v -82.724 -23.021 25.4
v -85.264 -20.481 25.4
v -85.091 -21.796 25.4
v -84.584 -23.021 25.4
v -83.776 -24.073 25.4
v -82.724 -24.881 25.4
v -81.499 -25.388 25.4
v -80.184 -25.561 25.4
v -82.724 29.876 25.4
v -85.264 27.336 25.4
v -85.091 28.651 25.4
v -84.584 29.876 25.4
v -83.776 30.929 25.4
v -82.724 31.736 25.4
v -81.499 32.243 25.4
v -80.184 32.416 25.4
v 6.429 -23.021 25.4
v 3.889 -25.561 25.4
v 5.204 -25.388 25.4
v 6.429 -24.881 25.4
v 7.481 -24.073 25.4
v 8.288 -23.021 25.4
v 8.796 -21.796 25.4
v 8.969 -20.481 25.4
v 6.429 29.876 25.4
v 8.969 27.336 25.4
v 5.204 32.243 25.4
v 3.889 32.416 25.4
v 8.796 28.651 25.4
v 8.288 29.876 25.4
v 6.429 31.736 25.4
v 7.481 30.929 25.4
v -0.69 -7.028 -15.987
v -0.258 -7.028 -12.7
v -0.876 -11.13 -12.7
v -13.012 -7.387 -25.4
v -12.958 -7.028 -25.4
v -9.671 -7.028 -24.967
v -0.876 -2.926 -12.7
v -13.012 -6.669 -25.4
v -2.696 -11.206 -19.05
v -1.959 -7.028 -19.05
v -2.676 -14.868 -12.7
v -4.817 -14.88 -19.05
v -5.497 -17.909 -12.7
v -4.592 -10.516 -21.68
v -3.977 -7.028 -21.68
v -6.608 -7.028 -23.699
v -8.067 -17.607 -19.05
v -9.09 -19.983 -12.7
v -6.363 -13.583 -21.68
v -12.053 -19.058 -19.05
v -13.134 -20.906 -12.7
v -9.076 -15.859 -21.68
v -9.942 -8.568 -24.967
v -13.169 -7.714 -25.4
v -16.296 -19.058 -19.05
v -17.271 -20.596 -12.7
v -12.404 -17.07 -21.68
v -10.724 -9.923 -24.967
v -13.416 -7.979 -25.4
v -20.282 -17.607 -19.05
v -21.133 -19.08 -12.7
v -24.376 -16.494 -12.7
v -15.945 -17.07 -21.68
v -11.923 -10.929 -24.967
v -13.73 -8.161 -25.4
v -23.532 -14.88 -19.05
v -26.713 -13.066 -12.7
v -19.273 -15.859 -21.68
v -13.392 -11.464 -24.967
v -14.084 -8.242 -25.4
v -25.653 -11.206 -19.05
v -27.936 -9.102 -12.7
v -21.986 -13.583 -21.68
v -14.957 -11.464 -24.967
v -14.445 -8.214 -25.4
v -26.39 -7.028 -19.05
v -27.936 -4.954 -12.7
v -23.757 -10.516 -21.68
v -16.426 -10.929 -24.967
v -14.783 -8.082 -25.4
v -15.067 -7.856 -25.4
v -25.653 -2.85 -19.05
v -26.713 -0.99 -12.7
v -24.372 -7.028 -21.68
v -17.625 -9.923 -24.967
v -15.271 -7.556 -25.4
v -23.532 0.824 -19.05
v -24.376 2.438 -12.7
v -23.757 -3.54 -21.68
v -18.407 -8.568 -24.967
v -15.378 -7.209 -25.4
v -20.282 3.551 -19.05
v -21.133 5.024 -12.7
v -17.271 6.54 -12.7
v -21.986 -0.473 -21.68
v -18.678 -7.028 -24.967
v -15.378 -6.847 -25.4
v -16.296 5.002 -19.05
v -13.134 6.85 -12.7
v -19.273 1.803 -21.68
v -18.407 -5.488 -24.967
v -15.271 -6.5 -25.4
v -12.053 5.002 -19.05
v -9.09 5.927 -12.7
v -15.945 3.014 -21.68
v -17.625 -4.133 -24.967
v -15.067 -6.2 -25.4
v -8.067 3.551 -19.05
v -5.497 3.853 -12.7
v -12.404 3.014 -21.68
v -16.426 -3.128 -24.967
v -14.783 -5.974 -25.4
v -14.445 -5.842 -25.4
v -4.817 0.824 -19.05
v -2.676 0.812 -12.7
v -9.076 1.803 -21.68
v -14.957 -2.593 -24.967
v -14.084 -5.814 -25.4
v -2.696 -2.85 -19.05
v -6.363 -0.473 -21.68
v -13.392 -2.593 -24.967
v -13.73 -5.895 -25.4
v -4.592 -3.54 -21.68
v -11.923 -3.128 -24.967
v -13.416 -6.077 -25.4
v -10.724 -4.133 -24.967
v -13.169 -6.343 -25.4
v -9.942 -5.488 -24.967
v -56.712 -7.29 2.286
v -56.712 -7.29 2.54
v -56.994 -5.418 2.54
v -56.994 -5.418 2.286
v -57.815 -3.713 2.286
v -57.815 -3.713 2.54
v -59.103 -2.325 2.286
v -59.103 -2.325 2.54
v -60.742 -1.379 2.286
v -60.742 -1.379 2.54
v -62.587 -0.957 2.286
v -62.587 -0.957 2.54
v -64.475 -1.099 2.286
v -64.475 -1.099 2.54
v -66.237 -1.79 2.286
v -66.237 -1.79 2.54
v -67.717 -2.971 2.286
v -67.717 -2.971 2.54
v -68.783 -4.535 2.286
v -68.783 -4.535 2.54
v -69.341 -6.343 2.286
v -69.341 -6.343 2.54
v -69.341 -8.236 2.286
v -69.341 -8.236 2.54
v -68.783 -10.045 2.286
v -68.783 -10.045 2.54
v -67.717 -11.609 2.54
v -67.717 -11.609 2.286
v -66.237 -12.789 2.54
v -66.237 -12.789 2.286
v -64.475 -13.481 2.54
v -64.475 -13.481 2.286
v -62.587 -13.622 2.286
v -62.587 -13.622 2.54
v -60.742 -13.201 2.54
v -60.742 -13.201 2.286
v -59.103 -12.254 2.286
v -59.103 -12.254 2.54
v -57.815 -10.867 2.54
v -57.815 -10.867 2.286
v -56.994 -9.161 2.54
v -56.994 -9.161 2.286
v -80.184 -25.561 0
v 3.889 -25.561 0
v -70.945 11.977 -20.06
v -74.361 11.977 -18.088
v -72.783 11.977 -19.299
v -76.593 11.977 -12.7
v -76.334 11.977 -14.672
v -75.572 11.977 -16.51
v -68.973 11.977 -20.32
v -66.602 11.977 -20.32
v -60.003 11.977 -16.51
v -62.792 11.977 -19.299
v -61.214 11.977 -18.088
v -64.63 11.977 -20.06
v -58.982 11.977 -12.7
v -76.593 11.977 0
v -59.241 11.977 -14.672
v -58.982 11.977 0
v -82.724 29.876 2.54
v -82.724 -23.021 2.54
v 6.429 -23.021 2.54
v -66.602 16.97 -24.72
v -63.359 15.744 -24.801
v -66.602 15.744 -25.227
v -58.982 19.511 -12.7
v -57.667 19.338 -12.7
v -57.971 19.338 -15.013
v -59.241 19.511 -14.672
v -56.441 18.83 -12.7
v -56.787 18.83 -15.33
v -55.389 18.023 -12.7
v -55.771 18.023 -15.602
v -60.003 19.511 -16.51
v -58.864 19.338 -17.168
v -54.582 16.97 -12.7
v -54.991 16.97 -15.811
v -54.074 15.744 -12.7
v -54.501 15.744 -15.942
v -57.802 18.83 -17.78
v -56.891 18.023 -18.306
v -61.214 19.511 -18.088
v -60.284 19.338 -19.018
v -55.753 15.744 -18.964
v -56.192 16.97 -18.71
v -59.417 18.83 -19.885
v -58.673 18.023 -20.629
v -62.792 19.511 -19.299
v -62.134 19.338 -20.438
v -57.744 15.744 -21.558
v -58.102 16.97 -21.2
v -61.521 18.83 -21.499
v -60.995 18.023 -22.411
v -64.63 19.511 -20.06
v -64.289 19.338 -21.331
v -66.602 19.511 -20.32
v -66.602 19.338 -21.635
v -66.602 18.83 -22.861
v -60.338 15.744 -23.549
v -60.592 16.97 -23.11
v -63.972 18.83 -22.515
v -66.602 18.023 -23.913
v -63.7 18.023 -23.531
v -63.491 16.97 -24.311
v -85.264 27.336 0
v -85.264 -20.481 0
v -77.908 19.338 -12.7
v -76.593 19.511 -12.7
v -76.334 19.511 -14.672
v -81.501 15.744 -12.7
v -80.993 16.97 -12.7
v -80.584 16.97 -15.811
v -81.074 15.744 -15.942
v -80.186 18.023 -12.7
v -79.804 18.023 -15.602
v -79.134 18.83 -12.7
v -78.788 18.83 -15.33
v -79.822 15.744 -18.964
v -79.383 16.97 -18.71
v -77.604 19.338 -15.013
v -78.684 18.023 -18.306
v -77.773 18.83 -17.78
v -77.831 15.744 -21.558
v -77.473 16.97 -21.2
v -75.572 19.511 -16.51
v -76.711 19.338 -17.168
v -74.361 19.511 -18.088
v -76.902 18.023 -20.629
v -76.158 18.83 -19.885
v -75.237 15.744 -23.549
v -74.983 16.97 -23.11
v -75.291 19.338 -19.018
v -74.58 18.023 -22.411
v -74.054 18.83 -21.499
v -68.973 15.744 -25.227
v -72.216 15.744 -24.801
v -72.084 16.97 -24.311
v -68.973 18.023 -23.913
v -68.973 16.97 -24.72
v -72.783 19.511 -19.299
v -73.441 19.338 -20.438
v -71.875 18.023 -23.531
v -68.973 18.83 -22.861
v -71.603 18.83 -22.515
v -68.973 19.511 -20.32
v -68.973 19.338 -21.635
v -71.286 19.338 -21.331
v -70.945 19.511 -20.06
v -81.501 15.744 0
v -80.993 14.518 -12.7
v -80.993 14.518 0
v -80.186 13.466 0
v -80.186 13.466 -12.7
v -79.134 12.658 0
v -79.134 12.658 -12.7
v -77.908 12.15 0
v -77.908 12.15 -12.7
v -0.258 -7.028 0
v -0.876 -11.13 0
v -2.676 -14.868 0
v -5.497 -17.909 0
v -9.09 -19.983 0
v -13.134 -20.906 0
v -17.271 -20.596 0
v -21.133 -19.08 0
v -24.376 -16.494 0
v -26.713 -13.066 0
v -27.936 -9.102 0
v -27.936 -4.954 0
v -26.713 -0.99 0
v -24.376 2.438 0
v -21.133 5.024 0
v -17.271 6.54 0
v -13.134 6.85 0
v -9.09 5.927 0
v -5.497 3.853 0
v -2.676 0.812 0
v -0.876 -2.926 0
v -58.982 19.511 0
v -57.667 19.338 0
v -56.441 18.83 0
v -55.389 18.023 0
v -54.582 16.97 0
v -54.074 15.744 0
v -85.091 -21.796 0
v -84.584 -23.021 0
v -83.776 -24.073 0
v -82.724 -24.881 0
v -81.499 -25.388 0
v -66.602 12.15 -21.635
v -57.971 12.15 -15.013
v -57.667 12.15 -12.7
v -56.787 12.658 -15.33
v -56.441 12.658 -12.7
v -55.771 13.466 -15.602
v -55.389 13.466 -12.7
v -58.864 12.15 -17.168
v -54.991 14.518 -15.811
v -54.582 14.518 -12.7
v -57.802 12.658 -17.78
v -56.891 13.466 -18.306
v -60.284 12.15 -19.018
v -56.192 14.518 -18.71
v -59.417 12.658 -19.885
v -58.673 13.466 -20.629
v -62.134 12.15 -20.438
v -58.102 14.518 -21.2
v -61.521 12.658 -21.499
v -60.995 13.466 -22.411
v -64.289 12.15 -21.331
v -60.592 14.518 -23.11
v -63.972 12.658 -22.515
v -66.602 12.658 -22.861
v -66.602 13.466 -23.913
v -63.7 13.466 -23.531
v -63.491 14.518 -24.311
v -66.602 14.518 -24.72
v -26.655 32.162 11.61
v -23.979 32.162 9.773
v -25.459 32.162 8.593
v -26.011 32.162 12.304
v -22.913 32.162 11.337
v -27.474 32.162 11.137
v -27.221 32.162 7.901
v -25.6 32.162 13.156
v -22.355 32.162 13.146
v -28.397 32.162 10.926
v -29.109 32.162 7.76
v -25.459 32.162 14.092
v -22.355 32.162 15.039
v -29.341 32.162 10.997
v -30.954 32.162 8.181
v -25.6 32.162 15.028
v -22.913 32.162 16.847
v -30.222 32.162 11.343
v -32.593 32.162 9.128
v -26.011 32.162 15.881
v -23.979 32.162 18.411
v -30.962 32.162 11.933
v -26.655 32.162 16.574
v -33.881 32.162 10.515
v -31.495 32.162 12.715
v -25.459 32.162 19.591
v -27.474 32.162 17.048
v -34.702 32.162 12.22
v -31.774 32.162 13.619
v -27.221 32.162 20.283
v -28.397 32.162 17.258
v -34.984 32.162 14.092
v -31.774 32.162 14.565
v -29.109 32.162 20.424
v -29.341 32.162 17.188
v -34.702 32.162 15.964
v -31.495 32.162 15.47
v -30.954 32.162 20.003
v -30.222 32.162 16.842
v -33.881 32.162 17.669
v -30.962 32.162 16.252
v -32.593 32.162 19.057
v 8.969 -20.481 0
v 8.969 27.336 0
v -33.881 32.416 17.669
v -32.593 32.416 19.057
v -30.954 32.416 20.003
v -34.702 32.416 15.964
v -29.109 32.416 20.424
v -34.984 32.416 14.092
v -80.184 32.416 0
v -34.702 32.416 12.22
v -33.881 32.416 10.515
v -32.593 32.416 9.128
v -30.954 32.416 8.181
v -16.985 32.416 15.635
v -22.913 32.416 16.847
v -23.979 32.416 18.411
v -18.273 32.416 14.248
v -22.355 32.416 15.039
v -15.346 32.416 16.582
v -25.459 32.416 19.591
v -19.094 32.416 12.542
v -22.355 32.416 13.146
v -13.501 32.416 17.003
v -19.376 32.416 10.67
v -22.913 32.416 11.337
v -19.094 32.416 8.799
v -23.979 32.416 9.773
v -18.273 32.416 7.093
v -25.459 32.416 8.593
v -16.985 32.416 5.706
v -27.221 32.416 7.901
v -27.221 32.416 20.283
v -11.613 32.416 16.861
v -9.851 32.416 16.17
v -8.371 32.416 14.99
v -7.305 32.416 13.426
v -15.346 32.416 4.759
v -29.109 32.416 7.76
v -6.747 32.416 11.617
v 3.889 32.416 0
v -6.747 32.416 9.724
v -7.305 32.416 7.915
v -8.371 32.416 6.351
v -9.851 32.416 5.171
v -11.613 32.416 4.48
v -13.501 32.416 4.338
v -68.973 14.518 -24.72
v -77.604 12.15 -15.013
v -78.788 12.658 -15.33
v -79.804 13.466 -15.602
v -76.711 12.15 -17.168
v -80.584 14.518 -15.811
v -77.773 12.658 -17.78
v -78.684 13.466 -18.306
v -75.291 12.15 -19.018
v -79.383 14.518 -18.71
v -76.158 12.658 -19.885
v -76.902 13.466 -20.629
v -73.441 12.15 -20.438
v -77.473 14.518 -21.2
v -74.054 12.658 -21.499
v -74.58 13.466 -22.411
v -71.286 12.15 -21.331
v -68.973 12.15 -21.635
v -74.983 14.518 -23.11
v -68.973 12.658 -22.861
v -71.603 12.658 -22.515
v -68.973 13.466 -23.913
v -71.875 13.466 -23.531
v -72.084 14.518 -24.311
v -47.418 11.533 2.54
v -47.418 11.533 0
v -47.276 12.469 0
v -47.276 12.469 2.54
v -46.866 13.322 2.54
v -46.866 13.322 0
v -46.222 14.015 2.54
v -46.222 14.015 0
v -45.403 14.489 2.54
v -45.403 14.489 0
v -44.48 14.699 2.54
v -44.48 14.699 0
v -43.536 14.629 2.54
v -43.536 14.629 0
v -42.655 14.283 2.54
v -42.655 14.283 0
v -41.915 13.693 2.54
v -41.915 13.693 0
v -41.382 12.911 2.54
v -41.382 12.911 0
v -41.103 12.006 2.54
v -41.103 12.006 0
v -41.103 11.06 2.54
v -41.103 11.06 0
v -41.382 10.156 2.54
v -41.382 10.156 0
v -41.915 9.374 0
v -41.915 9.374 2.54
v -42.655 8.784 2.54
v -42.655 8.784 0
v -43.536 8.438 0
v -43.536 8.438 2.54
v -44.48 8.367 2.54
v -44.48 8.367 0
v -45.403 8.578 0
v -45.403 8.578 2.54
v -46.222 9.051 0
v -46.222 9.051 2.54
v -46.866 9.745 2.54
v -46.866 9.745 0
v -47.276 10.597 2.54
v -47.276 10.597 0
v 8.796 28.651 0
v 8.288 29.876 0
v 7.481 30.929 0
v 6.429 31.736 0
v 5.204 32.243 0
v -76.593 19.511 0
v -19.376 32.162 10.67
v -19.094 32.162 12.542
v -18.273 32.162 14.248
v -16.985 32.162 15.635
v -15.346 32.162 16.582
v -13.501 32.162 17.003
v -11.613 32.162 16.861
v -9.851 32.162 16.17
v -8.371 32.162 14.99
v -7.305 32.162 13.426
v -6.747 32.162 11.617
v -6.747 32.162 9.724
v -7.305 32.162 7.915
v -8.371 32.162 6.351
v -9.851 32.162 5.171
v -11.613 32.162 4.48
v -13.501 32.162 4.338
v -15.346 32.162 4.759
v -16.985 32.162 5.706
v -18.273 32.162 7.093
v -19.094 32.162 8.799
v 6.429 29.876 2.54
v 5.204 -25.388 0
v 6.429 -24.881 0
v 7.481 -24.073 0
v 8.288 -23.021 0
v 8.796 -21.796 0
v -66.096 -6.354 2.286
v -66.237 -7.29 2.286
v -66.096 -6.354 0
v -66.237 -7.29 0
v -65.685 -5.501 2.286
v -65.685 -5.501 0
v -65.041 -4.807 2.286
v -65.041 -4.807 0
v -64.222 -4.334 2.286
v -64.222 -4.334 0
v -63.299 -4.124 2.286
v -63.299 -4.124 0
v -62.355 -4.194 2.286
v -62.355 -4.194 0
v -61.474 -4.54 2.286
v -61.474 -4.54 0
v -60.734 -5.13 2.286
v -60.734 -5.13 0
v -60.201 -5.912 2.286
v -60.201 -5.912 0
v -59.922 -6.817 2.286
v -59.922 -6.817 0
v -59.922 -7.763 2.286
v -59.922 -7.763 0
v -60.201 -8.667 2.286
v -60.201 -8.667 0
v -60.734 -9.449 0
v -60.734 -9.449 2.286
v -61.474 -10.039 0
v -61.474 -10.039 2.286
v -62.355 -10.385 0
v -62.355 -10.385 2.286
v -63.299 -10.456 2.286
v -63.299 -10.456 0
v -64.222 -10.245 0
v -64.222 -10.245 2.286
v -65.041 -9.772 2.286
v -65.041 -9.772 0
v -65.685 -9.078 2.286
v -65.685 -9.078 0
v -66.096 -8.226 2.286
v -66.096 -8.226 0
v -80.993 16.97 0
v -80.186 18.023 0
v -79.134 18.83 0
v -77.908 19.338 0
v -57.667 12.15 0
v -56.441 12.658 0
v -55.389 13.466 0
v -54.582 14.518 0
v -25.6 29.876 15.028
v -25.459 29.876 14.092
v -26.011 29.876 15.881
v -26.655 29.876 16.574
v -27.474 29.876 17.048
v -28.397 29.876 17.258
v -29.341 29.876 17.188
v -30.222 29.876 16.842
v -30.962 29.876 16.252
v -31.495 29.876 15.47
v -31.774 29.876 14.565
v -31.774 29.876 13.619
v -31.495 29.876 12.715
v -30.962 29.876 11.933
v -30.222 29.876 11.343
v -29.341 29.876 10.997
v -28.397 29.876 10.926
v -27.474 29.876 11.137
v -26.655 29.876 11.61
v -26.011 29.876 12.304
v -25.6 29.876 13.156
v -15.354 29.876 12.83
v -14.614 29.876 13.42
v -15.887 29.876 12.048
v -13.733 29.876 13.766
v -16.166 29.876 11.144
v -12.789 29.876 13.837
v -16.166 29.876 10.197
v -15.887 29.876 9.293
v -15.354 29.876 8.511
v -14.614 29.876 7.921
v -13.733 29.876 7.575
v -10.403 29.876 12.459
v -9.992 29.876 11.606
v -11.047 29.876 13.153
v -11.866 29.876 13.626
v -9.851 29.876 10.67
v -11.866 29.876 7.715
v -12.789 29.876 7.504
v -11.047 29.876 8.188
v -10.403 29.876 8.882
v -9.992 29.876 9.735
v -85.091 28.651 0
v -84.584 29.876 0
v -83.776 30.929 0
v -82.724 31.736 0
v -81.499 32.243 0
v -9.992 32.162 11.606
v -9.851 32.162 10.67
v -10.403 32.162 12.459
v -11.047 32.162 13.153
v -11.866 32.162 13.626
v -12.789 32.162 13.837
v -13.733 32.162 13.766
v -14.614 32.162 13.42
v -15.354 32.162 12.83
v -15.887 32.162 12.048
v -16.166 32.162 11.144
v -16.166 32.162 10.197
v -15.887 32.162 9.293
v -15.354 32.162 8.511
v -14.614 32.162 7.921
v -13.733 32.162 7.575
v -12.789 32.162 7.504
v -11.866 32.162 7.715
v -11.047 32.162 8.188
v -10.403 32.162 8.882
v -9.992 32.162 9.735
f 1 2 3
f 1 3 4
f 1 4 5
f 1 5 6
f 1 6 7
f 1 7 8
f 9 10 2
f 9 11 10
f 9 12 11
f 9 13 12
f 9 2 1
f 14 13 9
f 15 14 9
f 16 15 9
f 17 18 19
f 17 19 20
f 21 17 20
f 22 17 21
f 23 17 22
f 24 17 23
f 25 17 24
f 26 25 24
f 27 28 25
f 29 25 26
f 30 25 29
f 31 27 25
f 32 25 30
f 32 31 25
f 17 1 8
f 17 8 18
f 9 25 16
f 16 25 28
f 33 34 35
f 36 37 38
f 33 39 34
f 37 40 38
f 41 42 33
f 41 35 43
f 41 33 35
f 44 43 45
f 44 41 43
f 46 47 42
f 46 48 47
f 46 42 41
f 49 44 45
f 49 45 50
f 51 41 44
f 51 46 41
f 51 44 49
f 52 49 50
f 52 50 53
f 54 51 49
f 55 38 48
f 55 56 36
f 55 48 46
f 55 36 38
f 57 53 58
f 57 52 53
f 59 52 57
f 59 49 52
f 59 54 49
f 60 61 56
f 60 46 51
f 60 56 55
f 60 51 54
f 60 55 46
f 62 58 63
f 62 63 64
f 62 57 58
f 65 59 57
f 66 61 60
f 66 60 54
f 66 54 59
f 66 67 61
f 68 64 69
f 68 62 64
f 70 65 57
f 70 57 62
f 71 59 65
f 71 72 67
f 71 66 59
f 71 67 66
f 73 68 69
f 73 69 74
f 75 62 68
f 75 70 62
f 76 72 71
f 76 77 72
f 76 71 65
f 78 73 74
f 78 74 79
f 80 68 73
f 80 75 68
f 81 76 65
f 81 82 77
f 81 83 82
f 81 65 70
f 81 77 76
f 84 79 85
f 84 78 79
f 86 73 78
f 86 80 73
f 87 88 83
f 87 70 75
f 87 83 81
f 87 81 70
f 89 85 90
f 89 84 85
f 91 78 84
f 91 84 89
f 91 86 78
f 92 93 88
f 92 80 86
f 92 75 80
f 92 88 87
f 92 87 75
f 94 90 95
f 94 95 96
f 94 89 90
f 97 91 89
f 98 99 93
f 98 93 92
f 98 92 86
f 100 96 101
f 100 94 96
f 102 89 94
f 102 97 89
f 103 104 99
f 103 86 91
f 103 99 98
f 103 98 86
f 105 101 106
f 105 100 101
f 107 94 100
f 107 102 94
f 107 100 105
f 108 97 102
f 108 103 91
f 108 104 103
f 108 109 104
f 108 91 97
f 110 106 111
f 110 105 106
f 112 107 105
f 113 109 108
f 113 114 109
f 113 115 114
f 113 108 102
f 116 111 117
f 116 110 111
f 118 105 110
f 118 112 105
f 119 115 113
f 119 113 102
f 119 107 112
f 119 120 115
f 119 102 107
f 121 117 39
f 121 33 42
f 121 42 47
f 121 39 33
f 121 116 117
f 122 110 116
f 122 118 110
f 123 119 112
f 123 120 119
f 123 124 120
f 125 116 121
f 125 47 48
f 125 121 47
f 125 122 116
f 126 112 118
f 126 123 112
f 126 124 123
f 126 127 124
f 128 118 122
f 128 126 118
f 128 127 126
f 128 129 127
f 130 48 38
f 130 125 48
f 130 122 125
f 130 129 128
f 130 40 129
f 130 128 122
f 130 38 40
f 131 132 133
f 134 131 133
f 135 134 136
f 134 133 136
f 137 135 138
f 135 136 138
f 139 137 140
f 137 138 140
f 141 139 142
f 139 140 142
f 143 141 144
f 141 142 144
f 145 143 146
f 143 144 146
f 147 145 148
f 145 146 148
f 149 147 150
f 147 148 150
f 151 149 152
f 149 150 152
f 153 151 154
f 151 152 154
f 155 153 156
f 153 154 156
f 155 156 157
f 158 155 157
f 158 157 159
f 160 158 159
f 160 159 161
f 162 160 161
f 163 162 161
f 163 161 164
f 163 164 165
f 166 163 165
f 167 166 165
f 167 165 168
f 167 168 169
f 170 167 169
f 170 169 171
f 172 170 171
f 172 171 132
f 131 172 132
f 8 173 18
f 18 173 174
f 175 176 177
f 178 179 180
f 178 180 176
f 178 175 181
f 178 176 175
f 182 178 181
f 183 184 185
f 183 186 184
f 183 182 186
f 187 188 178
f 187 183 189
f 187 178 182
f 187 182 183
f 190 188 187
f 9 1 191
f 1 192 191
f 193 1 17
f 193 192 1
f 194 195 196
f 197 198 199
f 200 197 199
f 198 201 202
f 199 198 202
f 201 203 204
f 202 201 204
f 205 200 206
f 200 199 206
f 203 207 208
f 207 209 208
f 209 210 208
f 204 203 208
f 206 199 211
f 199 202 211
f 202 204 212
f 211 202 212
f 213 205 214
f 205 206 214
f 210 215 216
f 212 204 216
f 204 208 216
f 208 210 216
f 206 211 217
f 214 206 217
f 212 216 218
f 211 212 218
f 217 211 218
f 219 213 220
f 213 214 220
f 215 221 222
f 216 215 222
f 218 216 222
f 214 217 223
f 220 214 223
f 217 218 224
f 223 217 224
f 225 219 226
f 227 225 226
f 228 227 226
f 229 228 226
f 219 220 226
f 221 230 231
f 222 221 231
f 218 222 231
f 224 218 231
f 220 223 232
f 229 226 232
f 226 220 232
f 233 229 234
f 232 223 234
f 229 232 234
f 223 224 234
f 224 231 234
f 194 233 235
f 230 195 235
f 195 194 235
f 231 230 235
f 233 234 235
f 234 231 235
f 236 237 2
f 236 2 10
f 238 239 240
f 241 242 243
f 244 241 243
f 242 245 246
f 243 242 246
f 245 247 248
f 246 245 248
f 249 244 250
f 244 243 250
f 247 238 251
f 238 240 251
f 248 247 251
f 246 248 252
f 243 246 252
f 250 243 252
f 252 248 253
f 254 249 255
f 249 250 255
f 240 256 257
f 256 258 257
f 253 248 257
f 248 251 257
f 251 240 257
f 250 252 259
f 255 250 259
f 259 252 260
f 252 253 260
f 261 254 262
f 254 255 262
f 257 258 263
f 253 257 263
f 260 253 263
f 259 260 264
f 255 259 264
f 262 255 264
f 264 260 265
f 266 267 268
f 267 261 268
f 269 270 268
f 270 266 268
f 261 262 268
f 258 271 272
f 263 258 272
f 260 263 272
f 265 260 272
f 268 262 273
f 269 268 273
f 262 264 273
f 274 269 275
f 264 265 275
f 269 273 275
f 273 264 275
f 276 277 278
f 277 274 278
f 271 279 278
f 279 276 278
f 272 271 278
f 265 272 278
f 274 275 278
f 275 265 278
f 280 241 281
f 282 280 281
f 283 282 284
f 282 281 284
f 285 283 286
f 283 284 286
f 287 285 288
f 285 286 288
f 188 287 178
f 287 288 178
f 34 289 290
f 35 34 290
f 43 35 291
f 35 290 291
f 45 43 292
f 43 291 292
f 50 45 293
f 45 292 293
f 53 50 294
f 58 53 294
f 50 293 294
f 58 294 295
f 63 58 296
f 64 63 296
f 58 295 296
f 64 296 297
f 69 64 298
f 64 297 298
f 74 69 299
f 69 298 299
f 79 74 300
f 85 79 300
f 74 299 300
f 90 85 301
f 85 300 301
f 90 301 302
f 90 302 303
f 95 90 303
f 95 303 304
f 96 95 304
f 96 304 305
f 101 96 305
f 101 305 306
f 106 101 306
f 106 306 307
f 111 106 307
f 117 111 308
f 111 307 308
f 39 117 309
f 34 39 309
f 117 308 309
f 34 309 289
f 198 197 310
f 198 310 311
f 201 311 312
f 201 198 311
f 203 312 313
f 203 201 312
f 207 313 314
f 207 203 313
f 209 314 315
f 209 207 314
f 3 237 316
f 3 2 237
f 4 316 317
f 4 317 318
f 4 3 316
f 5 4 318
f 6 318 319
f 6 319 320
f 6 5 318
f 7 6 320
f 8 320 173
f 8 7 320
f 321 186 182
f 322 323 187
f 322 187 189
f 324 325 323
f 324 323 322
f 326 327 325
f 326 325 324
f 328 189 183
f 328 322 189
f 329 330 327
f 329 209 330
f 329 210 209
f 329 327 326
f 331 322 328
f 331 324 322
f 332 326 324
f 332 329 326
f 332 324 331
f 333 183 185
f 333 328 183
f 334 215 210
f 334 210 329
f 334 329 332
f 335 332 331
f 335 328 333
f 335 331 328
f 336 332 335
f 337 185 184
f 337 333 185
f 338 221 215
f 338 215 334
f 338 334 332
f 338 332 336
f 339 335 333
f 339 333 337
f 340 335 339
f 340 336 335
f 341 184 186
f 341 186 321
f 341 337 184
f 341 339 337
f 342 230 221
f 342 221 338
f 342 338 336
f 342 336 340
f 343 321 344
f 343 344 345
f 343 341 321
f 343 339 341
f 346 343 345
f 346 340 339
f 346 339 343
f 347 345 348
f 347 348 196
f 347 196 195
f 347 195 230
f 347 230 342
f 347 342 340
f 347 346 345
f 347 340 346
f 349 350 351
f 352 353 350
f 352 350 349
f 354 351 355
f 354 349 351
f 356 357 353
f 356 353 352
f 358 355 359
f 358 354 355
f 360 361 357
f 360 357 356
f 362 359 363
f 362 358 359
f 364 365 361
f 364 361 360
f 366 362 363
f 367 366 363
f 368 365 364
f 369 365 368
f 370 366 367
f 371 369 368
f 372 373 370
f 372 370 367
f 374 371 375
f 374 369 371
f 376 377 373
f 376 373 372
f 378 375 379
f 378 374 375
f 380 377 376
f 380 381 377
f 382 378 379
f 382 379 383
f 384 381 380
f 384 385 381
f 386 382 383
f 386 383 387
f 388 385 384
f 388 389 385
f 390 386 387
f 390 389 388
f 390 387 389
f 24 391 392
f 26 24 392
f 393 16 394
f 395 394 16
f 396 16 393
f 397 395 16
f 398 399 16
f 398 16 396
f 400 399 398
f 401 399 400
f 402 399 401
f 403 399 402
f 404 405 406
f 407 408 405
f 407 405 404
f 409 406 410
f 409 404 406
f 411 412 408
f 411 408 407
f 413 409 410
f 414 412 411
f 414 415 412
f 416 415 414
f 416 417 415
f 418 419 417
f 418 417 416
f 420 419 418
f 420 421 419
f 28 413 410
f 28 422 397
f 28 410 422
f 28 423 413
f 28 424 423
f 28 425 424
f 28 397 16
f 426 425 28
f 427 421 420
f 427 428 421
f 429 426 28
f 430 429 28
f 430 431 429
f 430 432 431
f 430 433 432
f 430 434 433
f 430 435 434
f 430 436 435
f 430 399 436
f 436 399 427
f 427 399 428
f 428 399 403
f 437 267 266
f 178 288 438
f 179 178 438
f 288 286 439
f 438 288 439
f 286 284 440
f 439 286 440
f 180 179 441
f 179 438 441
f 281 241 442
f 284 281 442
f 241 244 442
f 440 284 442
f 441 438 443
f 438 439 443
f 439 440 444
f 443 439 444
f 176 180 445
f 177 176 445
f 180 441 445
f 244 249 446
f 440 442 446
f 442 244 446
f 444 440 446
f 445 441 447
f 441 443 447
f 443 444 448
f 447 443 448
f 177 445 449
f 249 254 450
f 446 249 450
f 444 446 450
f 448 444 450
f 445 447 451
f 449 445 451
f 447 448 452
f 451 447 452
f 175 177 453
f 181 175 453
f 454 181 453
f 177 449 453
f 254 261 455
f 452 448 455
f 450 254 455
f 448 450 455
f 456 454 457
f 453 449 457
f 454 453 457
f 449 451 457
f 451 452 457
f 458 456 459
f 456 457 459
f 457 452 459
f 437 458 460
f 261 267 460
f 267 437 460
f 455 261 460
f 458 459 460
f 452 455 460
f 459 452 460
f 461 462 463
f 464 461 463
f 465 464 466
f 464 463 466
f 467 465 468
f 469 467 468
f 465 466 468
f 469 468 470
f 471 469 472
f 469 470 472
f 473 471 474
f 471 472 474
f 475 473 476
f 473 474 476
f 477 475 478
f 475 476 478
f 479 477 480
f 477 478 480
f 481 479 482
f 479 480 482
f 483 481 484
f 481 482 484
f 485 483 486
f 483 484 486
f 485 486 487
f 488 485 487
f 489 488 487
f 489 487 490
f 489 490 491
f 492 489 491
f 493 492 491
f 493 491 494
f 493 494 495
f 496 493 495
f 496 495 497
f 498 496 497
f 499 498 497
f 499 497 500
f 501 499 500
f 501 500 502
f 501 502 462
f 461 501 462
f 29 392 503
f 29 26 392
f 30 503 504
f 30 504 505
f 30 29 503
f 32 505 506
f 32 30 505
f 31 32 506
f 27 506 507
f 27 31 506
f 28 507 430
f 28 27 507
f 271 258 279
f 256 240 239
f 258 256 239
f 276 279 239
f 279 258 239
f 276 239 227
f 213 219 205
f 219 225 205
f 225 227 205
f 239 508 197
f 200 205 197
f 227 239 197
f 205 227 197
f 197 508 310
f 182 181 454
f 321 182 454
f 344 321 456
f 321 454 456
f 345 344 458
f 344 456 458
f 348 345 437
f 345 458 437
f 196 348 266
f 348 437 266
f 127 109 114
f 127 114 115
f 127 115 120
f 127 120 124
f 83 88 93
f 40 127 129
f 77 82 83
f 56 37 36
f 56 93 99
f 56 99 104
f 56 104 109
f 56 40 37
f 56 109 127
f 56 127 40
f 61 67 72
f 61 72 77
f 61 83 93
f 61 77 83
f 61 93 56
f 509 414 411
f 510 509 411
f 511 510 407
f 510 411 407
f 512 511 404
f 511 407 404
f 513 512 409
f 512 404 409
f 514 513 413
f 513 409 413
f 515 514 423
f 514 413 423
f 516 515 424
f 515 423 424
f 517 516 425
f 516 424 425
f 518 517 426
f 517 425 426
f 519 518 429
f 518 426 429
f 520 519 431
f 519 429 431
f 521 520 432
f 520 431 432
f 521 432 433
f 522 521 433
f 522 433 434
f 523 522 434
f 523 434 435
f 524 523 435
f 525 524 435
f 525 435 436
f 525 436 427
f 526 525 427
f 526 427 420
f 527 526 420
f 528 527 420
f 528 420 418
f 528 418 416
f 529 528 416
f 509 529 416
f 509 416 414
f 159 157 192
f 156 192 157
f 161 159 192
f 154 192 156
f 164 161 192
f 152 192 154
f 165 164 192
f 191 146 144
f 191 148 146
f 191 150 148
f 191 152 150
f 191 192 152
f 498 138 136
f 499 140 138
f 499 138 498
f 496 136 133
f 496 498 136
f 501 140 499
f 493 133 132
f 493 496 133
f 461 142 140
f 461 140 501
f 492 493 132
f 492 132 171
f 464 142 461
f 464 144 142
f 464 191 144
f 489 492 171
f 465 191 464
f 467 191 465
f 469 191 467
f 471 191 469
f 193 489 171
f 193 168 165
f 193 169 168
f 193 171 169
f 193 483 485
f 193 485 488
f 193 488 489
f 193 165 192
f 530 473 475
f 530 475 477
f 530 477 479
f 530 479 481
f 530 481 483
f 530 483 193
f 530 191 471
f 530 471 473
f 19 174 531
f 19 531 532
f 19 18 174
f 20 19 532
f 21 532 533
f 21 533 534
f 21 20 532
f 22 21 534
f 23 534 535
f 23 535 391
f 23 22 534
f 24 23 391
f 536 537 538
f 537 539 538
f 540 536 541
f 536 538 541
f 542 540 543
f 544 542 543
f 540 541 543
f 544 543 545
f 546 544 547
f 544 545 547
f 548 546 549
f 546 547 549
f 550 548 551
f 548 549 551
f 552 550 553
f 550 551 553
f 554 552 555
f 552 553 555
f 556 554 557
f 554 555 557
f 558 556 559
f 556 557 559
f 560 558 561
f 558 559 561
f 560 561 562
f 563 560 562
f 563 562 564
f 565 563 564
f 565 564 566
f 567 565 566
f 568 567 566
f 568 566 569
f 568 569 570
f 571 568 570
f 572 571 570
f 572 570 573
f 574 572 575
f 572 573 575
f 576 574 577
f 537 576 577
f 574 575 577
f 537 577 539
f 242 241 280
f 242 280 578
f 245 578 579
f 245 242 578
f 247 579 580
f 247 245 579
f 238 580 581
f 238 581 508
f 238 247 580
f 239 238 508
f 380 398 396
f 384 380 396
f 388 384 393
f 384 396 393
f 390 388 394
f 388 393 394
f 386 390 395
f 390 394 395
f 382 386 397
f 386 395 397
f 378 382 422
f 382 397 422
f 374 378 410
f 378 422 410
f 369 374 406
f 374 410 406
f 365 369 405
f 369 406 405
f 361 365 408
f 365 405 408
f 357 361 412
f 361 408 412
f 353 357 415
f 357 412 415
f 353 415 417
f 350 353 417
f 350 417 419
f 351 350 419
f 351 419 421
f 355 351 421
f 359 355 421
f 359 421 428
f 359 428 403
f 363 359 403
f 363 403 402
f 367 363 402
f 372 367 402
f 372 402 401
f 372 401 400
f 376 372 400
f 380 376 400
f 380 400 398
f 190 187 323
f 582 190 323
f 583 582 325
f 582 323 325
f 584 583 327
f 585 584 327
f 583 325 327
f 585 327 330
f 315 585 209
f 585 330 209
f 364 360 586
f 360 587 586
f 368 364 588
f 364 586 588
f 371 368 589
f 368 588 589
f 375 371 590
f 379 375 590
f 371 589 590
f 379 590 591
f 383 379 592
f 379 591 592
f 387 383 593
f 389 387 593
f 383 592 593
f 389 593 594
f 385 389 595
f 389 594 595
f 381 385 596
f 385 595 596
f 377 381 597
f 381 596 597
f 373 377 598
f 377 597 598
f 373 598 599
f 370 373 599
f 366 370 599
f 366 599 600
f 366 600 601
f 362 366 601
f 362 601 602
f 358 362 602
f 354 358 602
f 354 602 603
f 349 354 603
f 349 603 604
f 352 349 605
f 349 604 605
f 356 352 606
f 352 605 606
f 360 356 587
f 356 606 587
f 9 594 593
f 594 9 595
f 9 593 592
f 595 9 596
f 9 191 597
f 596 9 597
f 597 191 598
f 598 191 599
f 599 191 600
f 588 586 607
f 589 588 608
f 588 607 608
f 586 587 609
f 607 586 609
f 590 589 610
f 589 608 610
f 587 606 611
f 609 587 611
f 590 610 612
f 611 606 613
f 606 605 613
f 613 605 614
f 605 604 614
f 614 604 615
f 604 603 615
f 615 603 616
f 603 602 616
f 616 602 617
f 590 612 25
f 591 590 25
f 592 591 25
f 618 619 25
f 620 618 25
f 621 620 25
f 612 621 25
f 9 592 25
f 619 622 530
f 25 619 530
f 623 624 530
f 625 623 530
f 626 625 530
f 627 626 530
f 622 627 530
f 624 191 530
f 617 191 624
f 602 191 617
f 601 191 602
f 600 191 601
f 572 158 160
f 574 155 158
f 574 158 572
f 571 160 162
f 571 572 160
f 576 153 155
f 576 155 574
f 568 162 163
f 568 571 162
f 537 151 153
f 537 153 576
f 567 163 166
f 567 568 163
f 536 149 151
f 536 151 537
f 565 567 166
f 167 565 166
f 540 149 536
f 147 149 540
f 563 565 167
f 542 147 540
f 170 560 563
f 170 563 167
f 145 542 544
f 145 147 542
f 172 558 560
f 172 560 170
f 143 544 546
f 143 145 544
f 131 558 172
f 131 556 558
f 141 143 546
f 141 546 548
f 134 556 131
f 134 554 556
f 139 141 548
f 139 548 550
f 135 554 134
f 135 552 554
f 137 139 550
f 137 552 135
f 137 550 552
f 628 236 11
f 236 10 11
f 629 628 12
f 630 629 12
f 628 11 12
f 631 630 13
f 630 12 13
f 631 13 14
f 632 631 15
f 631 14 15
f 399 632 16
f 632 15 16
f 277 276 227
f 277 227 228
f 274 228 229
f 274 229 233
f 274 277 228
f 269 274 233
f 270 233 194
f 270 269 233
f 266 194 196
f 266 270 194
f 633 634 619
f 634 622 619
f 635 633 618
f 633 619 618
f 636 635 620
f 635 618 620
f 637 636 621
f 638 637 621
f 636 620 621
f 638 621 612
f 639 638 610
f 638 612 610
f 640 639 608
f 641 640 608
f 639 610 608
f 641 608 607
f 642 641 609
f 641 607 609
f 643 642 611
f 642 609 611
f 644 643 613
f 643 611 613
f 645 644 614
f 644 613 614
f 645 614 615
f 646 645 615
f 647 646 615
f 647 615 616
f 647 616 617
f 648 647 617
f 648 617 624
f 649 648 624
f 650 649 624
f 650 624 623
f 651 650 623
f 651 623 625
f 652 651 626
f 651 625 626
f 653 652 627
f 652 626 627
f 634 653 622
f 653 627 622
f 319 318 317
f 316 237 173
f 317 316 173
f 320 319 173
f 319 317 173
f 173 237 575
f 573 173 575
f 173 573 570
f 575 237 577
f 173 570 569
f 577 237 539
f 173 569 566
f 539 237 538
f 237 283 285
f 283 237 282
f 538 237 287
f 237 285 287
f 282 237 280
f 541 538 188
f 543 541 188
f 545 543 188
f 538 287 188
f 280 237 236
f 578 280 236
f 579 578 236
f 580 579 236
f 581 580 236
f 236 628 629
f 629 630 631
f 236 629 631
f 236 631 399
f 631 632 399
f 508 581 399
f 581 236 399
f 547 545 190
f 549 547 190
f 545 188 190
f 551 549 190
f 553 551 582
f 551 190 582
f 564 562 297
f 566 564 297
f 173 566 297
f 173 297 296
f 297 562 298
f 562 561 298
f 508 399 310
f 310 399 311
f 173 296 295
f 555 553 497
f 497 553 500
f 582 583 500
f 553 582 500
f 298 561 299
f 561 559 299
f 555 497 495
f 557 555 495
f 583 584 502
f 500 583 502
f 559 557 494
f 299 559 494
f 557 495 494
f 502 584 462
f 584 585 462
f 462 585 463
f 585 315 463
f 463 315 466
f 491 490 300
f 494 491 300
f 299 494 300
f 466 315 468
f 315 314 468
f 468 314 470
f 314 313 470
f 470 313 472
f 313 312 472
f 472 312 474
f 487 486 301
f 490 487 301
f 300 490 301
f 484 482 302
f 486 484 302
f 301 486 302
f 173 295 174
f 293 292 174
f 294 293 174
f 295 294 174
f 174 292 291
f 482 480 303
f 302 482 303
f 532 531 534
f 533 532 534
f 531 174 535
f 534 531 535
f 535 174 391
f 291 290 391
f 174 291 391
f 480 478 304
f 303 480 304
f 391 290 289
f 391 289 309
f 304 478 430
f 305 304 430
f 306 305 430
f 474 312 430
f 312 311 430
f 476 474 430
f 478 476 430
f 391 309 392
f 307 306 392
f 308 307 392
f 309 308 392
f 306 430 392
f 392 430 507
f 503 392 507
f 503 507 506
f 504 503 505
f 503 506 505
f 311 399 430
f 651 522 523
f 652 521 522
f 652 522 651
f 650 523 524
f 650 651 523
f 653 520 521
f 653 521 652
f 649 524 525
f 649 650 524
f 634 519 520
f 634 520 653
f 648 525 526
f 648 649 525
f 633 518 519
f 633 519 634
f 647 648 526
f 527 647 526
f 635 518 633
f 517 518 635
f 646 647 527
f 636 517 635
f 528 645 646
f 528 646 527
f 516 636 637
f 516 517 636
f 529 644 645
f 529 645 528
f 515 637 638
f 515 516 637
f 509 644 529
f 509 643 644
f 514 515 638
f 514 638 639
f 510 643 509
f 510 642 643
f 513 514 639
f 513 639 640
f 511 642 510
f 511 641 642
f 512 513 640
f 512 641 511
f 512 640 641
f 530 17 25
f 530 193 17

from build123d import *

# Parameters (mm, degrees)
F0_W           = 94.2332278937
F0_H           = 57.9777825624
F1_DEPTH       = 25.4
F2_T           = -2.54
F3_R           = 5.08
F5_D           = 6.35
F7_D           = 6.35
F7_DEPTH       = 12.7
F7_CBORE_D     = 12.7
F7_CBORE_DEPTH = 0.254
F7_TIP         = 1.9077324654
F9_D           = 6.35
F9_DEPTH       = 12.7
F9_CBORE_D     = 12.7
F9_CBORE_DEPTH = 0.254
F9_TIP         = 1.9077324654
F10_R          = 13.9169366501
F11_DEPTH      = 25.4
F12_R          = 12.7
F13_W          = 27.7714207768
F13_H          = 7.534484379
F14_DEPTH      = 25.4
F15_R          = 12.7
F16_T1_DEPTH   = 12.7
F16_T3_DEPTH   = 2.3714207768
F16_T6_ANGLE   = 90
F16_T8_ANGLE   = 90
F16_T10_ANGLE  = 90
F16_T12_ANGLE  = 90


# Not quite as in the source:
# - a fillet or chamfer that OpenCascade refuses, or shapes differently, is made with other operations: its cross-section is extruded or revolved along the edge and cut away or added


with BuildPart() as f1:
    # F0 (on Top) → F1 (new body)
    with BuildSketch(Plane.XY):
        with Locations((-38.147569634, 3.4275231883)):
            Rectangle(F0_W, F0_H)
    extrude(amount=F1_DEPTH)

    # F2
    f2_openings = [f1.faces().sort_by_distance(p)[0] for p in [
        (-38.14757, 3.427523, 25.4),
    ]]
    offset(amount=F2_T, openings=f2_openings)

    # F3
    f3_edges = [f1.edges().sort_by_distance(p)[0] for p in [
        (-85.264184, -25.561368, 12.7),
        (8.969044, -25.561368, 12.7),
        (8.969044, 32.416414, 12.7),
        (-85.264184, 32.416414, 12.7),
    ]]
    fillet(f3_edges, radius=F3_R)

    # F5 (through all)
    with Locations(Plane.XY.offset(2.54)):
        with Locations((-44.2425459623, 11.5331579)):
            Hole(F5_D / 2)

    # F7
    with Locations(Plane.XY.offset(2.54)):
        with Locations((-63.0617812276, -7.2897328064)):
            CounterBoreHole(F7_D / 2, F7_CBORE_D / 2, F7_CBORE_DEPTH, depth=F7_DEPTH)
            with Locations((0, 0, -(F7_DEPTH + F7_TIP / 2))):  # 118° drill point
                Cone(0, F7_D / 2, F7_TIP, mode=Mode.SUBTRACT)

    # F9
    with Locations(Plane(origin=(0, 32.4164144695, 0), x_dir=(-1, 0, 0), z_dir=(0, 1, 0))):
        with Locations((13.0262067541, 10.6704961509), (28.6341179162, 14.0921706334)):
            CounterBoreHole(F9_D / 2, F9_CBORE_D / 2, F9_CBORE_DEPTH, depth=F9_DEPTH)
            with Locations((0, 0, -(F9_DEPTH + F9_TIP / 2))):  # 118° drill point
                Cone(0, F9_D / 2, F9_TIP, mode=Mode.SUBTRACT)

    # F10 (on face) → F11 (join)
    with BuildSketch(Plane(origin=(0, 0, 0), x_dir=(1, 0, 0), z_dir=(0, 0, -1))):
        with Locations((-14.1745125875, 7.0280302316)):
            Circle(F10_R)
    extrude(amount=F11_DEPTH)

    # F12
    f12_edges = [f1.edges().sort_by_distance(p)[0] for p in [
        (-28.091449, -7.02803, -25.4),
    ]]
    fillet(f12_edges, radius=F12_R)

    # F13 (on face) → F14 (join)
    with BuildSketch(Plane(origin=(0, 0, 0), x_dir=(1, 0, 0), z_dir=(0, 0, -1))):
        with Locations((-67.7874796093, -15.7441017218)):
            Rectangle(F13_W, F13_H)
    extrude(amount=F14_DEPTH)

    # F15
    f15_edges = [f1.edges().sort_by_distance(p)[0] for p in [
        (-53.901769, 15.744102, -25.4),
        (-81.67319, 15.744102, -25.4),
    ]]
    fillet(f15_edges, radius=F15_R)

    # F16: fillet of radius 5.08 on 2 edges, made by hand

    # F16_s2 → F16_t1 (cut)
    with BuildSketch(Plane.XY.offset(-12.7)):
        with BuildLine():
            ThreePointArc((-58.9817692208, 19.5113439113), (-55.3896667724, 18.0234463597), (-53.9017692208, 14.4313439113))
            Line((-53.9017692208, 14.4313439113), (-53.9017692208, 19.5113439113))
            Line((-53.9017692208, 19.5113439113), (-58.9817692208, 19.5113439113))
        make_face()
        with BuildLine():
            ThreePointArc((-81.6731899977, 14.4313439113), (-80.1852924461, 18.0234463597), (-76.5931899977, 19.5113439113))
            Line((-76.5931899977, 19.5113439113), (-81.6731899977, 19.5113439113))
            Line((-81.6731899977, 19.5113439113), (-81.6731899977, 14.4313439113))
        make_face()
        with BuildLine():
            ThreePointArc((-81.6731899977, 17.0568595323), (-80.1852924461, 13.4647570839), (-76.5931899977, 11.9768595323))
            Line((-76.5931899977, 11.9768595323), (-81.6731899977, 11.9768595323))
            Line((-81.6731899977, 11.9768595323), (-81.6731899977, 17.0568595323))
        make_face()
        with BuildLine():
            ThreePointArc((-58.9817692208, 11.9768595323), (-55.3896667724, 13.4647570839), (-53.9017692208, 17.0568595323))
            Line((-53.9017692208, 17.0568595323), (-53.9017692208, 11.9768595323))
            Line((-53.9017692208, 11.9768595323), (-58.9817692208, 11.9768595323))
        make_face()
    extrude(amount=F16_T1_DEPTH, mode=Mode.SUBTRACT)

    # F16_s4 → F16_t3 (cut)
    with BuildSketch(Plane.YZ.offset(-68.9731899977)):
        with BuildLine():
            ThreePointArc((19.5113439113, -20.32), (18.0234463597, -23.9121024484), (14.4313439113, -25.4))
            Line((14.4313439113, -25.4), (19.5113439113, -25.4))
            Line((19.5113439113, -25.4), (19.5113439113, -20.32))
        make_face()
        with BuildLine():
            ThreePointArc((11.9768595323, -20.32), (13.4647570839, -23.9121024484), (17.0568595323, -25.4))
            Line((17.0568595323, -25.4), (11.9768595323, -25.4))
            Line((11.9768595323, -25.4), (11.9768595323, -20.32))
        make_face()
    extrude(amount=F16_T3_DEPTH, mode=Mode.SUBTRACT)

    # F16_s5 → F16_t6 (revolve, cut)
    with BuildSketch(Plane.XY.offset(-12.7)):
        with BuildLine():
            ThreePointArc((-76.5931899977, 11.9768595323), (-80.1852924461, 13.4647570839), (-81.6731899977, 17.0568595323))
            Line((-81.6731899977, 17.0568595323), (-81.6731899977, 11.9768595323))
            Line((-81.6731899977, 11.9768595323), (-76.5931899977, 11.9768595323))
        make_face()
    revolve(axis=Axis((-68.9731899977, 11.9768595323, -12.7), (0, -1, 0)), revolution_arc=F16_T6_ANGLE, mode=Mode.SUBTRACT)

    # F16_s7 → F16_t8 (revolve, cut)
    with BuildSketch(Plane.XY.offset(-12.7)):
        with BuildLine():
            ThreePointArc((-58.9817692208, 19.5113439113), (-55.3896667724, 18.0234463597), (-53.9017692208, 14.4313439113))
            Line((-53.9017692208, 14.4313439113), (-53.9017692208, 19.5113439113))
            Line((-53.9017692208, 19.5113439113), (-58.9817692208, 19.5113439113))
        make_face()
    revolve(axis=Axis((-66.6017692208, 19.5113439113, -12.7), (0, 1, 0)), revolution_arc=F16_T8_ANGLE, mode=Mode.SUBTRACT)

    # F16_s9 → F16_t10 (revolve, cut)
    with BuildSketch(Plane.XY.offset(-12.7)):
        with BuildLine():
            ThreePointArc((-81.6731899977, 14.4313439113), (-80.1852924461, 18.0234463597), (-76.5931899977, 19.5113439113))
            Line((-76.5931899977, 19.5113439113), (-81.6731899977, 19.5113439113))
            Line((-81.6731899977, 19.5113439113), (-81.6731899977, 14.4313439113))
        make_face()
    revolve(axis=Axis((-68.9731899977, 19.5113439113, -12.7), (0, -1, 0)), revolution_arc=F16_T10_ANGLE, mode=Mode.SUBTRACT)

    # F16_s11 → F16_t12 (revolve, cut)
    with BuildSketch(Plane.XY.offset(-12.7)):
        with BuildLine():
            ThreePointArc((-58.9817692208, 11.9768595323), (-55.3896667724, 13.4647570839), (-53.9017692208, 17.0568595323))
            Line((-53.9017692208, 17.0568595323), (-53.9017692208, 11.9768595323))
            Line((-53.9017692208, 11.9768595323), (-58.9817692208, 11.9768595323))
        make_face()
    revolve(axis=Axis((-66.6017692208, 11.9768595323, -12.7), (0, 1, 0)), revolution_arc=F16_T12_ANGLE, mode=Mode.SUBTRACT)


solid = f1.part
